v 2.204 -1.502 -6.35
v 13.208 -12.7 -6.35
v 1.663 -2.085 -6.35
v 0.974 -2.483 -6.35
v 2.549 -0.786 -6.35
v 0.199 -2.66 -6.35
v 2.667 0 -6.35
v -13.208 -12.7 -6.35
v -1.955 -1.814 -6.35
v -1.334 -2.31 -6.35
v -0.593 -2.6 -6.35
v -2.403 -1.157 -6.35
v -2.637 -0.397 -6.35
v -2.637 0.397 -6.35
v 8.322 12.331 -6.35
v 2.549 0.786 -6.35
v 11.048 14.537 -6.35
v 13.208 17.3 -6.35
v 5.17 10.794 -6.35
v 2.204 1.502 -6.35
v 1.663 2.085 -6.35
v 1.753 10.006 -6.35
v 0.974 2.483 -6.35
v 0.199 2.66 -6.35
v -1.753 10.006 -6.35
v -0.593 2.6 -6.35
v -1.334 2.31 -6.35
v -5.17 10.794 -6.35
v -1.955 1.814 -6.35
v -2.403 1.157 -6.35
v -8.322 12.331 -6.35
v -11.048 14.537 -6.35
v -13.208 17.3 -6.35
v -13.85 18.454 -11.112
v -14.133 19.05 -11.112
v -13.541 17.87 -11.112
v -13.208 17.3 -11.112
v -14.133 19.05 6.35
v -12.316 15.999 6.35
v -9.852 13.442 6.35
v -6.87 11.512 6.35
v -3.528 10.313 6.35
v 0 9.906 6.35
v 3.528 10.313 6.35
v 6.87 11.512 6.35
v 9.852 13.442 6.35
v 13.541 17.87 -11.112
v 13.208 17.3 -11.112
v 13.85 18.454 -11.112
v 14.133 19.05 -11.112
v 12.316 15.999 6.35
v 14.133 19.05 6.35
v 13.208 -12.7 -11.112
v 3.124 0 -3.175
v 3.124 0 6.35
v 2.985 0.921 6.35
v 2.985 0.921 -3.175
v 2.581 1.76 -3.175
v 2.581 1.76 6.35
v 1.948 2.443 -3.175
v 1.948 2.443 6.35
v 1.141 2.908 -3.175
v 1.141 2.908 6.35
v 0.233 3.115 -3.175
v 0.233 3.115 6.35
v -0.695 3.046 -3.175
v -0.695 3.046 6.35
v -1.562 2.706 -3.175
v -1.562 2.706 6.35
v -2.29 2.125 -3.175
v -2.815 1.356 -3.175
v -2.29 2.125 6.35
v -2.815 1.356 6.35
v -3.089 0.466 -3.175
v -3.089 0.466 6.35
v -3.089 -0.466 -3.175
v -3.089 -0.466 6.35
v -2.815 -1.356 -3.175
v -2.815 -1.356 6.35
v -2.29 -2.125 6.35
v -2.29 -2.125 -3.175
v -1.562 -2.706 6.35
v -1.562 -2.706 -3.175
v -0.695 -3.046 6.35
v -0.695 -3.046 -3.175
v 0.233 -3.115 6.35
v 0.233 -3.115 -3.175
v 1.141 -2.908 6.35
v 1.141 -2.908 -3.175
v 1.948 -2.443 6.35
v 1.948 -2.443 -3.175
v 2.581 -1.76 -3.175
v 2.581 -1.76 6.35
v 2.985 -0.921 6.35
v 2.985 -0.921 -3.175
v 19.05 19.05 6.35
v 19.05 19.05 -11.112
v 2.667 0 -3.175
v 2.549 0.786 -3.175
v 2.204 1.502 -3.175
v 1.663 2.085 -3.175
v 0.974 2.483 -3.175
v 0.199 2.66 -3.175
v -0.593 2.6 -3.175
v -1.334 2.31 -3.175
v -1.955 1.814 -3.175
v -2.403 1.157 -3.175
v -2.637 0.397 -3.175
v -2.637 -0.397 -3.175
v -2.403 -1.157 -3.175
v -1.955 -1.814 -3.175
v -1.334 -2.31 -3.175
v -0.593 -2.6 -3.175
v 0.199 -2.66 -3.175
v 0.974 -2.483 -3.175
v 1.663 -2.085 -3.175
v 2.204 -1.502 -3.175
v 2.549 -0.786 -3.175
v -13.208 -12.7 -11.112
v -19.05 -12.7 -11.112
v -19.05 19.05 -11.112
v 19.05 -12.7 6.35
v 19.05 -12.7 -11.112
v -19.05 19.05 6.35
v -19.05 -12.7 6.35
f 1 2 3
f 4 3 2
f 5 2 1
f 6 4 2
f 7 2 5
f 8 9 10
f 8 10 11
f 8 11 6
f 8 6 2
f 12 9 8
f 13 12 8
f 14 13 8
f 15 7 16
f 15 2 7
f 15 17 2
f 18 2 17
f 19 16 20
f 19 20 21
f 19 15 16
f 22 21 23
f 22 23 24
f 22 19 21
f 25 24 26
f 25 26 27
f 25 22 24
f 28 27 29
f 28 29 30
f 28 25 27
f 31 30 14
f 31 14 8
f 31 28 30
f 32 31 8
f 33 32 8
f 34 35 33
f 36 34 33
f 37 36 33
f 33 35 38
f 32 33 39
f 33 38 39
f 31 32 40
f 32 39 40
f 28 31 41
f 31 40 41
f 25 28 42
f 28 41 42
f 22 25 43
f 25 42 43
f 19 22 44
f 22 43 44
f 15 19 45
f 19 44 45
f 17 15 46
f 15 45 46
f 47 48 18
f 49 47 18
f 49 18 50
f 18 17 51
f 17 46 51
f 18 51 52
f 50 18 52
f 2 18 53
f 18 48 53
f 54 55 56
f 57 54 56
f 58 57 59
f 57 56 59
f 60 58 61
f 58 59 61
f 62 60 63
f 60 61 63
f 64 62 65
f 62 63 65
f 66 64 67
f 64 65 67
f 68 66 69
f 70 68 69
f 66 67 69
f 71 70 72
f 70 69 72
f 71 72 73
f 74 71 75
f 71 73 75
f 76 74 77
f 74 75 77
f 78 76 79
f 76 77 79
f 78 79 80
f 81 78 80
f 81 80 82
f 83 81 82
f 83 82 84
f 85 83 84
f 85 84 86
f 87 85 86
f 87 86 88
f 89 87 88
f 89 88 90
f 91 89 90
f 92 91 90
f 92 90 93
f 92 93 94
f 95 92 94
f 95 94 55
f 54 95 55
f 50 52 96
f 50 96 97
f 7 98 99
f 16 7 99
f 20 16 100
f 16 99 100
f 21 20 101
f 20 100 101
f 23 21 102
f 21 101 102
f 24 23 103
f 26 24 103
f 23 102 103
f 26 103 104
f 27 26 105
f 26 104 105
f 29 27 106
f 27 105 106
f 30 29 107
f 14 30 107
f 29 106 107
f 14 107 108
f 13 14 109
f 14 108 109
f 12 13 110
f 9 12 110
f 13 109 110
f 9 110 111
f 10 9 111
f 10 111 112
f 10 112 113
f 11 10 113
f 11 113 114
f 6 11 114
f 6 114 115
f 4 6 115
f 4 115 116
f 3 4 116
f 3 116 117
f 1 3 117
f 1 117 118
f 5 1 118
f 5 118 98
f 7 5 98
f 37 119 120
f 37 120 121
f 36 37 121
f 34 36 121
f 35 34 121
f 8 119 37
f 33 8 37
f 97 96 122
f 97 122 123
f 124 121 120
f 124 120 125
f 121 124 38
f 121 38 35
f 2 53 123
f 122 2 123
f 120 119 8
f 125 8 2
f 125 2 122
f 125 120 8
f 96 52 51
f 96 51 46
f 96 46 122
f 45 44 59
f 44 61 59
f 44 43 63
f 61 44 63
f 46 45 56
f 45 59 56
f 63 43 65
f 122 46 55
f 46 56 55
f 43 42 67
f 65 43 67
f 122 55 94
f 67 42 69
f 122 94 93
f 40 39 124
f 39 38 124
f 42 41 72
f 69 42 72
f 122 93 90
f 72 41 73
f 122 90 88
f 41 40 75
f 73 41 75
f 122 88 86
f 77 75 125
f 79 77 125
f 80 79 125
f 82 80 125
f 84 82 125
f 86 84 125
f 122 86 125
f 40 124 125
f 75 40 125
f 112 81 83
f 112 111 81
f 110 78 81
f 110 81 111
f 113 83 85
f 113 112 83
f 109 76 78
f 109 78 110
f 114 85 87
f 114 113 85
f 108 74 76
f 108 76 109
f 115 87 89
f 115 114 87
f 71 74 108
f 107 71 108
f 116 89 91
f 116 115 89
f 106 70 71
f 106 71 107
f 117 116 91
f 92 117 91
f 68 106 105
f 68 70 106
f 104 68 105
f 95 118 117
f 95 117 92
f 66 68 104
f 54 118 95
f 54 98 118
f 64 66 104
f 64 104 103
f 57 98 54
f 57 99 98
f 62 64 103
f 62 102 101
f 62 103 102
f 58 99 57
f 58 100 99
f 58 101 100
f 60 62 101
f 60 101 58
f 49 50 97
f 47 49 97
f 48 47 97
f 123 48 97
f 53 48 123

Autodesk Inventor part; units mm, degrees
ref_plane "YZ Plane" through (0, 0, 0) normal (1, 0, 0) x (0, 1, 0)
ref_plane "XZ Plane" through (0, 0, 0) normal (0, 1, 0) x (-1, 0, 0)
ref_plane "XY Plane" through (0, 0, 0) normal (0, 0, 1) x (1, 0, 0)
sketch "Sketch3" plane through (0, 0, 0) normal (0, 0, 1) x (1, 0, 0)
  line L0 (-12.7, -19.05) -> (12.7, -19.05)
  line L1 (12.7, -19.05) -> (12.7, 19.05)
  line L2 (12.7, 19.05) -> (-12.7, 19.05)
  line L3 (-12.7, 19.05) -> (-12.7, -19.05)
  line L4 (-12.7, -19.05) -> (12.7, 19.05) construction
  line L5 (12.7, -19.05) -> (-12.7, 19.05) construction
  point P0 (0, 0)
  dimension "d0" = 25.4
  dimension "d1" = 38.1
extrude "Extrusion1" add sketch "Sketch3" along normal mid plane 12.7
sketch "Sketch4" plane through (0, 0, 6.35) normal (0, 0, 1) x (1, 0, 0)
  circle A0 centre (0, 0) radius 2.667
  dimension "d4" = 5.334
extrude "Extrusion2" cut sketch "Sketch4" against normal through all
sketch "Sketch5" plane through (-12.7, -19.05, 6.35) normal (-1, 0, 0) x (0, 0, 1)
  line L0 (3.175, 6.35) -> (50.8, 6.35) projected
  line L1 (-12.7, 38.1) -> (-12.7, 0) projected
  line L2 (0, 0) -> (0, 38.1) projected
  line L3 (-12.7, 0) -> (0, 0)
  line L4 (0, 0) -> (0, 6.35)
  line L5 (0, 6.35) -> (-12.7, 6.35)
  line L6 (-12.7, 6.35) -> (-12.7, 0)
  point P0 (-6.35, 19.05)
  point P1 (-12.7, 6.35)
  dimension "d9" = 6.35
extrude "Extrusion3" cut sketch "Sketch5" against normal through all
sketch "Sketch8" plane through (-12.7, -12.7, -6.35) normal (-1, 0, 0) x (0, 0, 1)
  line L0 (-4.7625, 21.8398) -> (-4.7625, 13.2284) projected
  line L1 (12.7, 0) -> (12.7, 31.75) projected
  line L2 (12.7, 0) -> (-4.7625, 0)
  line L3 (-4.7625, 0) -> (-4.7625, 31.75)
  line L4 (-4.7625, 31.75) -> (12.7, 31.75)
  line L5 (12.7, 31.75) -> (12.7, 0)
  point P0 (6.35, 12.7)
  point P1 (-4.7625, 13.2284)
extrude "Extrusion5" add sketch "Sketch8" along normal blind 6.35
mirror "Mirror1" about plane through (0, 0, 0) normal (1, 0, 0) of "Extrusion5"
sketch "Sketch6" plane through (0, 0, 0) normal (0, 0, 1) x (1, 0, 0)
  circle A0 centre (0, 25.4) radius 15.494
  point P0 (0, 0)
  dimension "d10" = 25.4
  dimension "d13" = 30.988
extrude "cutOutForGuide" cut sketch "Sketch6" along normal through all both and the other way through all
sketch "Sketch9" plane through (0, 0, 6.35) normal (0, 0, 1) x (1, 0, 0)
  circle A0 centre (0, 0) radius 3.1242
  dimension "d16" = 6.2484
extrude "Extrusion6" cut sketch "Sketch9" against normal blind 9.525
sketch "Sketch10" plane through (-12.7, -12.7, -11.1125) normal (0, 0, -1) x (-1, 0, 0)
  line L0 (0, 0) -> (6.35, 0) projected
  line L1 (0, 0) -> (0.508, 0)
  line L2 (0.508, 0) -> (0.508, 36.9717)
  line L3 (0.508, 36.9717) -> (0, 36.9717)
  line L4 (0, 36.9717) -> (0, 0)
  point P0 (-12.7, 12.7)
  point P1 (0.508, 0)
  dimension "d19" = 0.508
extrude "Extrusion7" cut sketch "Sketch10" against normal blind 4.7625
mirror "Mirror2" about plane through (0, 0, 0) normal (1, 0, 0) of "Extrusion7"
properties part number "leo" material "PBT Plastic"
